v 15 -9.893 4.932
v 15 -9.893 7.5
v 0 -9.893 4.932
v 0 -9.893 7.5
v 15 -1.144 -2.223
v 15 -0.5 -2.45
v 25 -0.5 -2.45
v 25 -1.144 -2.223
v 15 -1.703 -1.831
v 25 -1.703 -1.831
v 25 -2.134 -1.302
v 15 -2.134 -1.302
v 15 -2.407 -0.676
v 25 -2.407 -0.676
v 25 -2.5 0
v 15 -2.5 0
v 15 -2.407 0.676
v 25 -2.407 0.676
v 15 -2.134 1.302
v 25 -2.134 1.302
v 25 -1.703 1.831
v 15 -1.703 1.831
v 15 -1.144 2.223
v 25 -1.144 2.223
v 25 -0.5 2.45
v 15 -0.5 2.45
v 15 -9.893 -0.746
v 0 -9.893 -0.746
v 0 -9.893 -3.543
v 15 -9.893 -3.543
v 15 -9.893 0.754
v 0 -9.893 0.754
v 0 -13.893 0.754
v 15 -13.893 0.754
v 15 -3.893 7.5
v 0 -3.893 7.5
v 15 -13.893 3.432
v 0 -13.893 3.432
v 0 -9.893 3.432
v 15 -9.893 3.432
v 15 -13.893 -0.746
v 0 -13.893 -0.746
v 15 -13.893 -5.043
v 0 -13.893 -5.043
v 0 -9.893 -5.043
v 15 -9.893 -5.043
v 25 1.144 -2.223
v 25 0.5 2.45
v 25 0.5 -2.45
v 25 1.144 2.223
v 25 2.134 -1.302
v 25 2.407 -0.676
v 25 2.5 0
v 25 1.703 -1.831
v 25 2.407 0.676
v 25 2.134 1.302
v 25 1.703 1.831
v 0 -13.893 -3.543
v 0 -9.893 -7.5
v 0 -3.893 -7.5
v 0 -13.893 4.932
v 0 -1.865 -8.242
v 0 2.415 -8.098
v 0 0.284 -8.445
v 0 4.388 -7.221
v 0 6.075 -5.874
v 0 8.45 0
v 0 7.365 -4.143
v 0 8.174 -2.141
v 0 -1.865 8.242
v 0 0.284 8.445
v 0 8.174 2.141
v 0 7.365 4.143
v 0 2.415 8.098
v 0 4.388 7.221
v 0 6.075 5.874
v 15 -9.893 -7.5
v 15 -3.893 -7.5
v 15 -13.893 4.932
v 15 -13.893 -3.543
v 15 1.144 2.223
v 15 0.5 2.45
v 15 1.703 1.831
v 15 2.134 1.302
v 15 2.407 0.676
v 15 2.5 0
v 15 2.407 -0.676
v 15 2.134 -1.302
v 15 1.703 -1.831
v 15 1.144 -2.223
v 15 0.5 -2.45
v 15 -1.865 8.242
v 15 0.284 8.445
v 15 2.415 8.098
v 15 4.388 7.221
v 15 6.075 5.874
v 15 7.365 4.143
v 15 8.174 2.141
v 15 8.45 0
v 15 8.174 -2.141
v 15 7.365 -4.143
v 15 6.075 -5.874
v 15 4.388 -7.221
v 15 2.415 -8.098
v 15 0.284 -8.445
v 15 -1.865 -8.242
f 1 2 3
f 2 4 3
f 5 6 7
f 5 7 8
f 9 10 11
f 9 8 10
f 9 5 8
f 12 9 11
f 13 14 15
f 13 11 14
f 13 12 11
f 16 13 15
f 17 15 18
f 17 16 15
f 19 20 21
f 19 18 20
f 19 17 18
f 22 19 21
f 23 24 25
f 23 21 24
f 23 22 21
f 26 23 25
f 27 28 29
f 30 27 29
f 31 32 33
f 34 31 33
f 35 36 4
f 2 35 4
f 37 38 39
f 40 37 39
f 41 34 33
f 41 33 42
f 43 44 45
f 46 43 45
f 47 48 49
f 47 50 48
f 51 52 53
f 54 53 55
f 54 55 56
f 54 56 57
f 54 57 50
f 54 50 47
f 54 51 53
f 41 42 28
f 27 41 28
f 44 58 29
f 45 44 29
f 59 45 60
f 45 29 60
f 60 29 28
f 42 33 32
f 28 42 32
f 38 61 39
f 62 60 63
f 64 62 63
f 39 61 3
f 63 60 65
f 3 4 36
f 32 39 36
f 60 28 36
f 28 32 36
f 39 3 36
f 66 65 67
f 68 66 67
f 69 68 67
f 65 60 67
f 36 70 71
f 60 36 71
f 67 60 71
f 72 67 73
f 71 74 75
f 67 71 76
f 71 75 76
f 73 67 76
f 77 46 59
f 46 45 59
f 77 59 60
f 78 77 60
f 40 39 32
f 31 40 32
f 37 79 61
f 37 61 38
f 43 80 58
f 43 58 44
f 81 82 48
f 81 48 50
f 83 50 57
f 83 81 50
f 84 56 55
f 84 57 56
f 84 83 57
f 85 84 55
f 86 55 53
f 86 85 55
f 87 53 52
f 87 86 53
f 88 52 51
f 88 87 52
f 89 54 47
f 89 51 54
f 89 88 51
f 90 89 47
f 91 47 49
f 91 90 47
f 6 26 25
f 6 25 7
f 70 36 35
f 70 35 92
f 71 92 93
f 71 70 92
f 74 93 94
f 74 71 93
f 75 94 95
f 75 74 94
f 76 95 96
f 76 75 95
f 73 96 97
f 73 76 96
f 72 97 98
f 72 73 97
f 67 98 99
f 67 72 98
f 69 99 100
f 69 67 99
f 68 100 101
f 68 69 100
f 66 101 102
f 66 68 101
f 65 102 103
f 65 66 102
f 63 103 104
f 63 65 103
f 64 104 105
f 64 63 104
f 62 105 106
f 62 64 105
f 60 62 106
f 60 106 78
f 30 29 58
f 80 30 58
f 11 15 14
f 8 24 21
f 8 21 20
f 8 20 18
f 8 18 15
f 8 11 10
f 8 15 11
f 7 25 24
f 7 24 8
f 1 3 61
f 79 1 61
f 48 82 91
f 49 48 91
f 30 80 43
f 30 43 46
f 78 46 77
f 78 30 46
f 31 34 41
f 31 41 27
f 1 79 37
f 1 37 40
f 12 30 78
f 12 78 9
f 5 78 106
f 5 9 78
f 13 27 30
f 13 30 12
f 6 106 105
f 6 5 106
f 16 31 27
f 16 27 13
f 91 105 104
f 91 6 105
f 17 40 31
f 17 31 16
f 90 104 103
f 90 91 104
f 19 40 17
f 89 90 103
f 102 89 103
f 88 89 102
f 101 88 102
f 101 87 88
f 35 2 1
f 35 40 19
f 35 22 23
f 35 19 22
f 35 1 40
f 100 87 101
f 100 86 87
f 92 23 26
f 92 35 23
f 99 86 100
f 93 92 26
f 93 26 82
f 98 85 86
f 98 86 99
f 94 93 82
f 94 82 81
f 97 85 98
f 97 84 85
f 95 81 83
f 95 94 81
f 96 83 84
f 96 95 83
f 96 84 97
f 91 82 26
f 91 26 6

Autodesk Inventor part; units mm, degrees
ref_plane "YZ Plane" through (0, 0, 0) normal (1, 0, 0) x (0, 1, 0)
ref_plane "XZ Plane" through (0, 0, 0) normal (0, 1, 0) x (-1, 0, 0)
ref_plane "XY Plane" through (0, 0, 0) normal (0, 0, 1) x (1, 0, 0)
sketch "스케치1" plane through (0, 0, 0) normal (1, 0, 0) x (0, 1, 0)
  circle A0 centre (0, 0) radius 8.45
  dimension "d0" = 16.9
extrude "돌출1" add sketch "스케치1" along normal blind 15
sketch "스케치2" plane through (15, 0, 0) normal (1, 0, 0) x (0, 0, -1)
  circle A0 centre (0, 0) radius 2.5
  line L0 (-2.4495, 0.5) -> (2.4495, 0.5)
  line L1 (-2.4495, -0.5) -> (2.4495, -0.5)
  point P0 (0, 0.5)
  dimension "d3" = 5
  dimension "d4" = 1
  dimension "d5" = 0.5
extrude "돌출2" add sketch "스케치2" along normal blind 10 contours L0 A0 | A0 L1
sketch "스케치3" plane through (0, 0, 0) normal (-1, 0, 0) x (0, 0, 1)
  line L0 (-7.5, -3.8926) -> (7.5, -3.8926)
  line L1 (7.5, -3.8926) -> (7.5, -9.8926)
  line L2 (7.5, -9.8926) -> (-7.5, -9.8926)
  line L3 (-7.5, -9.8926) -> (-7.5, -3.8926)
  circle A0 centre (0, 0) radius 8.45 projected
  line L4 (-5.0426, -9.8926) -> (-3.5426, -9.8926)
  line L5 (-3.5426, -9.8926) -> (-3.5426, -13.8926)
  line L6 (-3.5426, -13.8926) -> (-5.0426, -13.8926)
  line L7 (-5.0426, -13.8926) -> (-5.0426, -9.8926)
  line L8 (-0.7464, -9.8926) -> (0.7536, -9.8926)
  line L9 (0.7536, -9.8926) -> (0.7536, -13.8926)
  line L10 (0.7536, -13.8926) -> (-0.7464, -13.8926)
  line L11 (-0.7464, -13.8926) -> (-0.7464, -9.8926)
  line L12 (3.4319, -9.8926) -> (4.9319, -9.8926)
  line L13 (4.9319, -9.8926) -> (4.9319, -13.8926)
  line L14 (4.9319, -13.8926) -> (3.4319, -13.8926)
  line L15 (3.4319, -13.8926) -> (3.4319, -9.8926)
  point P0 (0.7536, -9.8926)
  dimension "d8" = 6
  dimension "d9" = 15
  dimension "d10" = 4
  dimension "d11" = 4
  dimension "d12" = 1.5
  dimension "d13" = 1.5
  dimension "d14" = 1.5
extrude "돌출3" add sketch "스케치3" against normal blind 15 contours A0 L1 L2 L3 | L2 L5 L6 L7 | L13 L14 L15 L2 | L2 L9 L10 L11
equation "\"d11\" = d10"
equation "\"d13\" = d12"
equation "\"d14\" = d12"
properties part number "가변저항"
